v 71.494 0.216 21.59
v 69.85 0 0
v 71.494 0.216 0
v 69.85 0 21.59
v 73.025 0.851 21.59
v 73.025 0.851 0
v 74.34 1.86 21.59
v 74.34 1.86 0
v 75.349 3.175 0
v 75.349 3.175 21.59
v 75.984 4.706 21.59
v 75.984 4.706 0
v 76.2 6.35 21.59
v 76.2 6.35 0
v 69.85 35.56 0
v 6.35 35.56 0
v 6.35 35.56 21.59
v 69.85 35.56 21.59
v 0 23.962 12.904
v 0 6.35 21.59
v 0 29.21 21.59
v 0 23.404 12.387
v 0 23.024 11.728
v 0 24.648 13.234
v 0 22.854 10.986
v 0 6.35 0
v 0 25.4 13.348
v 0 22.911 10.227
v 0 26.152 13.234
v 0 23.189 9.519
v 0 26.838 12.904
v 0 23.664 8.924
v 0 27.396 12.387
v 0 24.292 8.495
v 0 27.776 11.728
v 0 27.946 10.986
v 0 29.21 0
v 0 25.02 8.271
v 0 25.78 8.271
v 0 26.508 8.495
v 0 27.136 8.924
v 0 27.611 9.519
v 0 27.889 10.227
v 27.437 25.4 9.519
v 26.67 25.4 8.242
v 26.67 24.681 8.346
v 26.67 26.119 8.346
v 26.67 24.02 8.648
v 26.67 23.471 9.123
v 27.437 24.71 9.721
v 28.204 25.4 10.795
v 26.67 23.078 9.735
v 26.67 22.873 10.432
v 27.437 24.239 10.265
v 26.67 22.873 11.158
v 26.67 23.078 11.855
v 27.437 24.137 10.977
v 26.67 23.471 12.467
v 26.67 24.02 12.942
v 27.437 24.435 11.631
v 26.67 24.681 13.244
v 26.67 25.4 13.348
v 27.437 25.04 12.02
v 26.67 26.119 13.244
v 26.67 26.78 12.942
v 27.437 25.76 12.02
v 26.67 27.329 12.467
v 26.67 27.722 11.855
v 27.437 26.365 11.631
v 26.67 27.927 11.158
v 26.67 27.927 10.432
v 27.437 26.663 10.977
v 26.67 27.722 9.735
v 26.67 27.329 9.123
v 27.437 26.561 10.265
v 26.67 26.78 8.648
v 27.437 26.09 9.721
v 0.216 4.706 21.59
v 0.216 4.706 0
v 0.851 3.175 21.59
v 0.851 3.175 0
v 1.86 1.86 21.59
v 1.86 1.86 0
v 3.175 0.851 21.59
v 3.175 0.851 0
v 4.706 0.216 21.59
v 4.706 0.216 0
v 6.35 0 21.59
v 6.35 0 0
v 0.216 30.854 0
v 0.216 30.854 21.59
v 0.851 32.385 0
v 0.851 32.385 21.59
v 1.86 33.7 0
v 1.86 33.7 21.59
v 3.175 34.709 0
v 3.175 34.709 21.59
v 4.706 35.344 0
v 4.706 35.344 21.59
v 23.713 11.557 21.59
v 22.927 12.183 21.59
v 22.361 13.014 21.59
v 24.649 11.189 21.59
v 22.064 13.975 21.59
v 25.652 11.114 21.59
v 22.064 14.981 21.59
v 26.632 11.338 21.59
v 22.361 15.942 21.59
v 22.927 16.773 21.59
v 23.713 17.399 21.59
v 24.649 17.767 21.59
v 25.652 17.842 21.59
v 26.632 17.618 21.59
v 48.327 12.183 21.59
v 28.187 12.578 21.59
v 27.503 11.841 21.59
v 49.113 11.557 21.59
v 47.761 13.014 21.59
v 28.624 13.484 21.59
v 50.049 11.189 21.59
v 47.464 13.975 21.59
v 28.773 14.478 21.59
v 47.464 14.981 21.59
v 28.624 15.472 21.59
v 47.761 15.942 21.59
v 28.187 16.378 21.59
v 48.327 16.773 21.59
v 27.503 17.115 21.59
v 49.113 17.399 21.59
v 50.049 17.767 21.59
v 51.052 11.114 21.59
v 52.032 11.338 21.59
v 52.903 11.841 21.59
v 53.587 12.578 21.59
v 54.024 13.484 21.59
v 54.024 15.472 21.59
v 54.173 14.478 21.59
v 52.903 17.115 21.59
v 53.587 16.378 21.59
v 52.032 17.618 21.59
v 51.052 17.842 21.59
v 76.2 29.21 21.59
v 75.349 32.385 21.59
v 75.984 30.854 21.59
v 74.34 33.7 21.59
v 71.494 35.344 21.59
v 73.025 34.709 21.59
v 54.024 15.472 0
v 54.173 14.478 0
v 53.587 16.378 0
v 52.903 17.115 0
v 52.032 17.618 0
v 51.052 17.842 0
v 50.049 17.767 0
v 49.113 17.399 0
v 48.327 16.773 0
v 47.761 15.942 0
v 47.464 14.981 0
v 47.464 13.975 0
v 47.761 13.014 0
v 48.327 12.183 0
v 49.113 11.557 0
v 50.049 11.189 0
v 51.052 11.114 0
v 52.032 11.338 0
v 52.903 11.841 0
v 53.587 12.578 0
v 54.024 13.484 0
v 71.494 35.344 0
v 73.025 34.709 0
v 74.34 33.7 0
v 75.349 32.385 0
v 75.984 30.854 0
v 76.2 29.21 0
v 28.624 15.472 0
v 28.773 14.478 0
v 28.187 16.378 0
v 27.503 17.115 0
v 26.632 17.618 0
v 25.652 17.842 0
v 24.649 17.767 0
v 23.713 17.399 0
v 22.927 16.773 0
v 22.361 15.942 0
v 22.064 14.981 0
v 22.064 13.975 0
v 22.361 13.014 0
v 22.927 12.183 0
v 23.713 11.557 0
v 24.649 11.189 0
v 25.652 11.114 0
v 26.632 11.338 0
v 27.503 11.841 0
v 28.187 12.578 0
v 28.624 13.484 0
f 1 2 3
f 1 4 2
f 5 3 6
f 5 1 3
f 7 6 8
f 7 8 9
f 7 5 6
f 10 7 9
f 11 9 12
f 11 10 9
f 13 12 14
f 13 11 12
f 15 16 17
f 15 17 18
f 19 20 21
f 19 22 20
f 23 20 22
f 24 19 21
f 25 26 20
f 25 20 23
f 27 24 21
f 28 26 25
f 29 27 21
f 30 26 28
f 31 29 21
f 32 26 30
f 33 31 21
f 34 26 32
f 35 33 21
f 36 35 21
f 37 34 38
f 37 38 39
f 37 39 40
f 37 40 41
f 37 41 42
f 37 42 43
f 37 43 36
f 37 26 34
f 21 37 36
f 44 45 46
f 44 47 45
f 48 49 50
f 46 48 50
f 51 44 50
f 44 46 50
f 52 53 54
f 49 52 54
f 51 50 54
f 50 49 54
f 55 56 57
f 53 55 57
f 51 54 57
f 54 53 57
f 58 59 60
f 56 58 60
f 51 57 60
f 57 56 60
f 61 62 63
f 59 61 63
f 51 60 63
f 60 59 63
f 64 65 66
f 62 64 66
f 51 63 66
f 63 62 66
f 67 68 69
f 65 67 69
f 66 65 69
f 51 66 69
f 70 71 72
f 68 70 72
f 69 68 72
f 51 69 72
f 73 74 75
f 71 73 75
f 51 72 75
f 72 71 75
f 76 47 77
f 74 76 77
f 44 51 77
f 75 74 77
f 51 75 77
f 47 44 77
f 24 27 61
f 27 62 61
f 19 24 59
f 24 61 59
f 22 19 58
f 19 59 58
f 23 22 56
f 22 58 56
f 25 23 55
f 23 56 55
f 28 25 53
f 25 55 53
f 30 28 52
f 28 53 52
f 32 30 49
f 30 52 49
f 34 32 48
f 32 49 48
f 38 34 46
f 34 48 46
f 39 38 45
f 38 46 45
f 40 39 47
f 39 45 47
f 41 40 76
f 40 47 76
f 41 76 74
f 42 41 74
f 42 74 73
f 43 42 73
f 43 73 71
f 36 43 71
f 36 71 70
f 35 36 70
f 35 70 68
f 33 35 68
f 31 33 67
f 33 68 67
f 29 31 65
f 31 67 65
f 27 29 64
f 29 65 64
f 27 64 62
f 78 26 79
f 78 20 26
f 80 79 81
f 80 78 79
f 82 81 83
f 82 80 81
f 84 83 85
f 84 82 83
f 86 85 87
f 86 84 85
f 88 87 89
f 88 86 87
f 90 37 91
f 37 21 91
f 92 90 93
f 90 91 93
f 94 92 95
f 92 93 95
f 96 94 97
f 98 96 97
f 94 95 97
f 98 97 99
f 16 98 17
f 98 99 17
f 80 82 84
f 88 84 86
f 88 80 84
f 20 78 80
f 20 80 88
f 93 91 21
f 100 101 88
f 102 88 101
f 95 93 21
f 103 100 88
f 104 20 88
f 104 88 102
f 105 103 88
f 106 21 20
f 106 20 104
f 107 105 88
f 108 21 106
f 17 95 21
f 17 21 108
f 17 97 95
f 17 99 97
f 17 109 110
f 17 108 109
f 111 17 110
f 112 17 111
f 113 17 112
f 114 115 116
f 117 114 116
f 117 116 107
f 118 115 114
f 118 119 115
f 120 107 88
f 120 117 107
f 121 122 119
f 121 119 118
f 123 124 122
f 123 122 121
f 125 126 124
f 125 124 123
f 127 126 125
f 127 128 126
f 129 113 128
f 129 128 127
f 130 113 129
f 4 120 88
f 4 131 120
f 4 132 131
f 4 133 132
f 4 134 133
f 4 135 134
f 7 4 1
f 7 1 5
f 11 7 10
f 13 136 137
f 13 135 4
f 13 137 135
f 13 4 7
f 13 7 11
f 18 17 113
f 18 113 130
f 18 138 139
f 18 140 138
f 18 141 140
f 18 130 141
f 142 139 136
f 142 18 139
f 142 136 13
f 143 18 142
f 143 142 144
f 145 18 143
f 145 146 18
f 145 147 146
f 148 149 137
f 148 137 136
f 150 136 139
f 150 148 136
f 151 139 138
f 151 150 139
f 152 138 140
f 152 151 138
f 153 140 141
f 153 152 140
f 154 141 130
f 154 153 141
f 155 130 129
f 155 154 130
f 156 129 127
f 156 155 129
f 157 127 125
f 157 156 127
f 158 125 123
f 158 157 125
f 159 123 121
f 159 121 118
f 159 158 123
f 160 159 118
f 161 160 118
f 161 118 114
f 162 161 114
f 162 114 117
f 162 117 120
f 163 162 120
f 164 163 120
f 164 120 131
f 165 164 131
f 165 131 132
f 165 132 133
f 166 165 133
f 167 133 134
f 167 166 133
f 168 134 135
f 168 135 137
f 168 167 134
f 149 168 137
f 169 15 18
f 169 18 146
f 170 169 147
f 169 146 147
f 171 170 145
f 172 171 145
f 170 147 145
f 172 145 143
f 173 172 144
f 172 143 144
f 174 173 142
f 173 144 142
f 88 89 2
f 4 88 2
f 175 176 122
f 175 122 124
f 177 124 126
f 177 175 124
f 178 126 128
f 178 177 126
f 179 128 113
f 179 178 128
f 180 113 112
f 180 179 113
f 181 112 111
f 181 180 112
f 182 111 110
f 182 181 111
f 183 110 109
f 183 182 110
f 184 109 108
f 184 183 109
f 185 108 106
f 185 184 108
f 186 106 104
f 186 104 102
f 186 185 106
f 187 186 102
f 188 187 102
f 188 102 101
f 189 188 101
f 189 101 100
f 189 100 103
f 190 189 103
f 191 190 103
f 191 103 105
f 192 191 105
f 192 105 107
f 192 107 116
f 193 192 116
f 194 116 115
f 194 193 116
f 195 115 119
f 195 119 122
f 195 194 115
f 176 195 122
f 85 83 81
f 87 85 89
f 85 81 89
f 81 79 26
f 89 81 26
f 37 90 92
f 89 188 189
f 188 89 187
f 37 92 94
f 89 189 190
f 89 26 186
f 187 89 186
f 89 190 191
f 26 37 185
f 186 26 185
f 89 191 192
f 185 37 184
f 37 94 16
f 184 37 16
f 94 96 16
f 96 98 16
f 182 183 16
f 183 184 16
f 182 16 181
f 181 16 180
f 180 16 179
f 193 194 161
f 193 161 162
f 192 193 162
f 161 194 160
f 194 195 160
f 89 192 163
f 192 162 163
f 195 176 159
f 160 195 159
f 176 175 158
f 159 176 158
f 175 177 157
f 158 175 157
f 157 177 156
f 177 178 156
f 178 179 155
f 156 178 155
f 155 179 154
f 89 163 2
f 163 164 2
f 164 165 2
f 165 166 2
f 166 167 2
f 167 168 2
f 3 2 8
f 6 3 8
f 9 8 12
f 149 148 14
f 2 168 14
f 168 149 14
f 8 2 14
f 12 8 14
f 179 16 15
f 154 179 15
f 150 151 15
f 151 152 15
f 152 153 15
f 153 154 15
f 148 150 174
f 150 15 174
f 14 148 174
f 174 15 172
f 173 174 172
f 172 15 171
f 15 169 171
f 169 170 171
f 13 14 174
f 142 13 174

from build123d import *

# Parameters (mm, degrees)
SKETCH1_W                   = 76.2
SKETCH1_H                   = 35.56
SKETCH1_R                   = 3.3734375
BOSS_EXTRUDE1_DEPTH         = 21.59
FILLET1_R                   = 6.35
F_1_4_20_TAPPED_HOLE1_D     = 5.1054
F_1_4_20_TAPPED_HOLE1_DEPTH = 26.67
F_1_4_20_TAPPED_HOLE1_TIP   = 1.533816902


with BuildPart() as part:
    # Sketch1 → Boss-Extrude1 (new body)
    with BuildSketch(Plane.XY):
        with Locations((38.1, 17.78)):
            Rectangle(SKETCH1_W, SKETCH1_H)
        with Locations((25.4, 14.478)):
            Circle(SKETCH1_R, mode=Mode.SUBTRACT)
        with Locations((50.8, 14.478)):
            Circle(SKETCH1_R, mode=Mode.SUBTRACT)
    extrude(amount=BOSS_EXTRUDE1_DEPTH)

    # Fillet1
    fillet1_edges = [part.edges().sort_by_distance(p)[0] for p in [
        (0, 0, 10.795),
        (0, 35.56, 10.795),
        (76.2, 35.56, 10.795),
        (76.2, 0, 10.795),
    ]]
    fillet(fillet1_edges, radius=FILLET1_R)

    # 1/4-20 Tapped Hole1
    with Locations(Plane(origin=(0, 25.4, 10.795), x_dir=(0, 0, -1), z_dir=(-1, 0, 0))):
        with Locations((0, 0)):
            Hole(F_1_4_20_TAPPED_HOLE1_D / 2, depth=F_1_4_20_TAPPED_HOLE1_DEPTH)
            with Locations((0, 0, -(F_1_4_20_TAPPED_HOLE1_DEPTH + F_1_4_20_TAPPED_HOLE1_TIP / 2))):  # 118° drill point
                Cone(0, F_1_4_20_TAPPED_HOLE1_D / 2, F_1_4_20_TAPPED_HOLE1_TIP, mode=Mode.SUBTRACT)


solid = part.part
